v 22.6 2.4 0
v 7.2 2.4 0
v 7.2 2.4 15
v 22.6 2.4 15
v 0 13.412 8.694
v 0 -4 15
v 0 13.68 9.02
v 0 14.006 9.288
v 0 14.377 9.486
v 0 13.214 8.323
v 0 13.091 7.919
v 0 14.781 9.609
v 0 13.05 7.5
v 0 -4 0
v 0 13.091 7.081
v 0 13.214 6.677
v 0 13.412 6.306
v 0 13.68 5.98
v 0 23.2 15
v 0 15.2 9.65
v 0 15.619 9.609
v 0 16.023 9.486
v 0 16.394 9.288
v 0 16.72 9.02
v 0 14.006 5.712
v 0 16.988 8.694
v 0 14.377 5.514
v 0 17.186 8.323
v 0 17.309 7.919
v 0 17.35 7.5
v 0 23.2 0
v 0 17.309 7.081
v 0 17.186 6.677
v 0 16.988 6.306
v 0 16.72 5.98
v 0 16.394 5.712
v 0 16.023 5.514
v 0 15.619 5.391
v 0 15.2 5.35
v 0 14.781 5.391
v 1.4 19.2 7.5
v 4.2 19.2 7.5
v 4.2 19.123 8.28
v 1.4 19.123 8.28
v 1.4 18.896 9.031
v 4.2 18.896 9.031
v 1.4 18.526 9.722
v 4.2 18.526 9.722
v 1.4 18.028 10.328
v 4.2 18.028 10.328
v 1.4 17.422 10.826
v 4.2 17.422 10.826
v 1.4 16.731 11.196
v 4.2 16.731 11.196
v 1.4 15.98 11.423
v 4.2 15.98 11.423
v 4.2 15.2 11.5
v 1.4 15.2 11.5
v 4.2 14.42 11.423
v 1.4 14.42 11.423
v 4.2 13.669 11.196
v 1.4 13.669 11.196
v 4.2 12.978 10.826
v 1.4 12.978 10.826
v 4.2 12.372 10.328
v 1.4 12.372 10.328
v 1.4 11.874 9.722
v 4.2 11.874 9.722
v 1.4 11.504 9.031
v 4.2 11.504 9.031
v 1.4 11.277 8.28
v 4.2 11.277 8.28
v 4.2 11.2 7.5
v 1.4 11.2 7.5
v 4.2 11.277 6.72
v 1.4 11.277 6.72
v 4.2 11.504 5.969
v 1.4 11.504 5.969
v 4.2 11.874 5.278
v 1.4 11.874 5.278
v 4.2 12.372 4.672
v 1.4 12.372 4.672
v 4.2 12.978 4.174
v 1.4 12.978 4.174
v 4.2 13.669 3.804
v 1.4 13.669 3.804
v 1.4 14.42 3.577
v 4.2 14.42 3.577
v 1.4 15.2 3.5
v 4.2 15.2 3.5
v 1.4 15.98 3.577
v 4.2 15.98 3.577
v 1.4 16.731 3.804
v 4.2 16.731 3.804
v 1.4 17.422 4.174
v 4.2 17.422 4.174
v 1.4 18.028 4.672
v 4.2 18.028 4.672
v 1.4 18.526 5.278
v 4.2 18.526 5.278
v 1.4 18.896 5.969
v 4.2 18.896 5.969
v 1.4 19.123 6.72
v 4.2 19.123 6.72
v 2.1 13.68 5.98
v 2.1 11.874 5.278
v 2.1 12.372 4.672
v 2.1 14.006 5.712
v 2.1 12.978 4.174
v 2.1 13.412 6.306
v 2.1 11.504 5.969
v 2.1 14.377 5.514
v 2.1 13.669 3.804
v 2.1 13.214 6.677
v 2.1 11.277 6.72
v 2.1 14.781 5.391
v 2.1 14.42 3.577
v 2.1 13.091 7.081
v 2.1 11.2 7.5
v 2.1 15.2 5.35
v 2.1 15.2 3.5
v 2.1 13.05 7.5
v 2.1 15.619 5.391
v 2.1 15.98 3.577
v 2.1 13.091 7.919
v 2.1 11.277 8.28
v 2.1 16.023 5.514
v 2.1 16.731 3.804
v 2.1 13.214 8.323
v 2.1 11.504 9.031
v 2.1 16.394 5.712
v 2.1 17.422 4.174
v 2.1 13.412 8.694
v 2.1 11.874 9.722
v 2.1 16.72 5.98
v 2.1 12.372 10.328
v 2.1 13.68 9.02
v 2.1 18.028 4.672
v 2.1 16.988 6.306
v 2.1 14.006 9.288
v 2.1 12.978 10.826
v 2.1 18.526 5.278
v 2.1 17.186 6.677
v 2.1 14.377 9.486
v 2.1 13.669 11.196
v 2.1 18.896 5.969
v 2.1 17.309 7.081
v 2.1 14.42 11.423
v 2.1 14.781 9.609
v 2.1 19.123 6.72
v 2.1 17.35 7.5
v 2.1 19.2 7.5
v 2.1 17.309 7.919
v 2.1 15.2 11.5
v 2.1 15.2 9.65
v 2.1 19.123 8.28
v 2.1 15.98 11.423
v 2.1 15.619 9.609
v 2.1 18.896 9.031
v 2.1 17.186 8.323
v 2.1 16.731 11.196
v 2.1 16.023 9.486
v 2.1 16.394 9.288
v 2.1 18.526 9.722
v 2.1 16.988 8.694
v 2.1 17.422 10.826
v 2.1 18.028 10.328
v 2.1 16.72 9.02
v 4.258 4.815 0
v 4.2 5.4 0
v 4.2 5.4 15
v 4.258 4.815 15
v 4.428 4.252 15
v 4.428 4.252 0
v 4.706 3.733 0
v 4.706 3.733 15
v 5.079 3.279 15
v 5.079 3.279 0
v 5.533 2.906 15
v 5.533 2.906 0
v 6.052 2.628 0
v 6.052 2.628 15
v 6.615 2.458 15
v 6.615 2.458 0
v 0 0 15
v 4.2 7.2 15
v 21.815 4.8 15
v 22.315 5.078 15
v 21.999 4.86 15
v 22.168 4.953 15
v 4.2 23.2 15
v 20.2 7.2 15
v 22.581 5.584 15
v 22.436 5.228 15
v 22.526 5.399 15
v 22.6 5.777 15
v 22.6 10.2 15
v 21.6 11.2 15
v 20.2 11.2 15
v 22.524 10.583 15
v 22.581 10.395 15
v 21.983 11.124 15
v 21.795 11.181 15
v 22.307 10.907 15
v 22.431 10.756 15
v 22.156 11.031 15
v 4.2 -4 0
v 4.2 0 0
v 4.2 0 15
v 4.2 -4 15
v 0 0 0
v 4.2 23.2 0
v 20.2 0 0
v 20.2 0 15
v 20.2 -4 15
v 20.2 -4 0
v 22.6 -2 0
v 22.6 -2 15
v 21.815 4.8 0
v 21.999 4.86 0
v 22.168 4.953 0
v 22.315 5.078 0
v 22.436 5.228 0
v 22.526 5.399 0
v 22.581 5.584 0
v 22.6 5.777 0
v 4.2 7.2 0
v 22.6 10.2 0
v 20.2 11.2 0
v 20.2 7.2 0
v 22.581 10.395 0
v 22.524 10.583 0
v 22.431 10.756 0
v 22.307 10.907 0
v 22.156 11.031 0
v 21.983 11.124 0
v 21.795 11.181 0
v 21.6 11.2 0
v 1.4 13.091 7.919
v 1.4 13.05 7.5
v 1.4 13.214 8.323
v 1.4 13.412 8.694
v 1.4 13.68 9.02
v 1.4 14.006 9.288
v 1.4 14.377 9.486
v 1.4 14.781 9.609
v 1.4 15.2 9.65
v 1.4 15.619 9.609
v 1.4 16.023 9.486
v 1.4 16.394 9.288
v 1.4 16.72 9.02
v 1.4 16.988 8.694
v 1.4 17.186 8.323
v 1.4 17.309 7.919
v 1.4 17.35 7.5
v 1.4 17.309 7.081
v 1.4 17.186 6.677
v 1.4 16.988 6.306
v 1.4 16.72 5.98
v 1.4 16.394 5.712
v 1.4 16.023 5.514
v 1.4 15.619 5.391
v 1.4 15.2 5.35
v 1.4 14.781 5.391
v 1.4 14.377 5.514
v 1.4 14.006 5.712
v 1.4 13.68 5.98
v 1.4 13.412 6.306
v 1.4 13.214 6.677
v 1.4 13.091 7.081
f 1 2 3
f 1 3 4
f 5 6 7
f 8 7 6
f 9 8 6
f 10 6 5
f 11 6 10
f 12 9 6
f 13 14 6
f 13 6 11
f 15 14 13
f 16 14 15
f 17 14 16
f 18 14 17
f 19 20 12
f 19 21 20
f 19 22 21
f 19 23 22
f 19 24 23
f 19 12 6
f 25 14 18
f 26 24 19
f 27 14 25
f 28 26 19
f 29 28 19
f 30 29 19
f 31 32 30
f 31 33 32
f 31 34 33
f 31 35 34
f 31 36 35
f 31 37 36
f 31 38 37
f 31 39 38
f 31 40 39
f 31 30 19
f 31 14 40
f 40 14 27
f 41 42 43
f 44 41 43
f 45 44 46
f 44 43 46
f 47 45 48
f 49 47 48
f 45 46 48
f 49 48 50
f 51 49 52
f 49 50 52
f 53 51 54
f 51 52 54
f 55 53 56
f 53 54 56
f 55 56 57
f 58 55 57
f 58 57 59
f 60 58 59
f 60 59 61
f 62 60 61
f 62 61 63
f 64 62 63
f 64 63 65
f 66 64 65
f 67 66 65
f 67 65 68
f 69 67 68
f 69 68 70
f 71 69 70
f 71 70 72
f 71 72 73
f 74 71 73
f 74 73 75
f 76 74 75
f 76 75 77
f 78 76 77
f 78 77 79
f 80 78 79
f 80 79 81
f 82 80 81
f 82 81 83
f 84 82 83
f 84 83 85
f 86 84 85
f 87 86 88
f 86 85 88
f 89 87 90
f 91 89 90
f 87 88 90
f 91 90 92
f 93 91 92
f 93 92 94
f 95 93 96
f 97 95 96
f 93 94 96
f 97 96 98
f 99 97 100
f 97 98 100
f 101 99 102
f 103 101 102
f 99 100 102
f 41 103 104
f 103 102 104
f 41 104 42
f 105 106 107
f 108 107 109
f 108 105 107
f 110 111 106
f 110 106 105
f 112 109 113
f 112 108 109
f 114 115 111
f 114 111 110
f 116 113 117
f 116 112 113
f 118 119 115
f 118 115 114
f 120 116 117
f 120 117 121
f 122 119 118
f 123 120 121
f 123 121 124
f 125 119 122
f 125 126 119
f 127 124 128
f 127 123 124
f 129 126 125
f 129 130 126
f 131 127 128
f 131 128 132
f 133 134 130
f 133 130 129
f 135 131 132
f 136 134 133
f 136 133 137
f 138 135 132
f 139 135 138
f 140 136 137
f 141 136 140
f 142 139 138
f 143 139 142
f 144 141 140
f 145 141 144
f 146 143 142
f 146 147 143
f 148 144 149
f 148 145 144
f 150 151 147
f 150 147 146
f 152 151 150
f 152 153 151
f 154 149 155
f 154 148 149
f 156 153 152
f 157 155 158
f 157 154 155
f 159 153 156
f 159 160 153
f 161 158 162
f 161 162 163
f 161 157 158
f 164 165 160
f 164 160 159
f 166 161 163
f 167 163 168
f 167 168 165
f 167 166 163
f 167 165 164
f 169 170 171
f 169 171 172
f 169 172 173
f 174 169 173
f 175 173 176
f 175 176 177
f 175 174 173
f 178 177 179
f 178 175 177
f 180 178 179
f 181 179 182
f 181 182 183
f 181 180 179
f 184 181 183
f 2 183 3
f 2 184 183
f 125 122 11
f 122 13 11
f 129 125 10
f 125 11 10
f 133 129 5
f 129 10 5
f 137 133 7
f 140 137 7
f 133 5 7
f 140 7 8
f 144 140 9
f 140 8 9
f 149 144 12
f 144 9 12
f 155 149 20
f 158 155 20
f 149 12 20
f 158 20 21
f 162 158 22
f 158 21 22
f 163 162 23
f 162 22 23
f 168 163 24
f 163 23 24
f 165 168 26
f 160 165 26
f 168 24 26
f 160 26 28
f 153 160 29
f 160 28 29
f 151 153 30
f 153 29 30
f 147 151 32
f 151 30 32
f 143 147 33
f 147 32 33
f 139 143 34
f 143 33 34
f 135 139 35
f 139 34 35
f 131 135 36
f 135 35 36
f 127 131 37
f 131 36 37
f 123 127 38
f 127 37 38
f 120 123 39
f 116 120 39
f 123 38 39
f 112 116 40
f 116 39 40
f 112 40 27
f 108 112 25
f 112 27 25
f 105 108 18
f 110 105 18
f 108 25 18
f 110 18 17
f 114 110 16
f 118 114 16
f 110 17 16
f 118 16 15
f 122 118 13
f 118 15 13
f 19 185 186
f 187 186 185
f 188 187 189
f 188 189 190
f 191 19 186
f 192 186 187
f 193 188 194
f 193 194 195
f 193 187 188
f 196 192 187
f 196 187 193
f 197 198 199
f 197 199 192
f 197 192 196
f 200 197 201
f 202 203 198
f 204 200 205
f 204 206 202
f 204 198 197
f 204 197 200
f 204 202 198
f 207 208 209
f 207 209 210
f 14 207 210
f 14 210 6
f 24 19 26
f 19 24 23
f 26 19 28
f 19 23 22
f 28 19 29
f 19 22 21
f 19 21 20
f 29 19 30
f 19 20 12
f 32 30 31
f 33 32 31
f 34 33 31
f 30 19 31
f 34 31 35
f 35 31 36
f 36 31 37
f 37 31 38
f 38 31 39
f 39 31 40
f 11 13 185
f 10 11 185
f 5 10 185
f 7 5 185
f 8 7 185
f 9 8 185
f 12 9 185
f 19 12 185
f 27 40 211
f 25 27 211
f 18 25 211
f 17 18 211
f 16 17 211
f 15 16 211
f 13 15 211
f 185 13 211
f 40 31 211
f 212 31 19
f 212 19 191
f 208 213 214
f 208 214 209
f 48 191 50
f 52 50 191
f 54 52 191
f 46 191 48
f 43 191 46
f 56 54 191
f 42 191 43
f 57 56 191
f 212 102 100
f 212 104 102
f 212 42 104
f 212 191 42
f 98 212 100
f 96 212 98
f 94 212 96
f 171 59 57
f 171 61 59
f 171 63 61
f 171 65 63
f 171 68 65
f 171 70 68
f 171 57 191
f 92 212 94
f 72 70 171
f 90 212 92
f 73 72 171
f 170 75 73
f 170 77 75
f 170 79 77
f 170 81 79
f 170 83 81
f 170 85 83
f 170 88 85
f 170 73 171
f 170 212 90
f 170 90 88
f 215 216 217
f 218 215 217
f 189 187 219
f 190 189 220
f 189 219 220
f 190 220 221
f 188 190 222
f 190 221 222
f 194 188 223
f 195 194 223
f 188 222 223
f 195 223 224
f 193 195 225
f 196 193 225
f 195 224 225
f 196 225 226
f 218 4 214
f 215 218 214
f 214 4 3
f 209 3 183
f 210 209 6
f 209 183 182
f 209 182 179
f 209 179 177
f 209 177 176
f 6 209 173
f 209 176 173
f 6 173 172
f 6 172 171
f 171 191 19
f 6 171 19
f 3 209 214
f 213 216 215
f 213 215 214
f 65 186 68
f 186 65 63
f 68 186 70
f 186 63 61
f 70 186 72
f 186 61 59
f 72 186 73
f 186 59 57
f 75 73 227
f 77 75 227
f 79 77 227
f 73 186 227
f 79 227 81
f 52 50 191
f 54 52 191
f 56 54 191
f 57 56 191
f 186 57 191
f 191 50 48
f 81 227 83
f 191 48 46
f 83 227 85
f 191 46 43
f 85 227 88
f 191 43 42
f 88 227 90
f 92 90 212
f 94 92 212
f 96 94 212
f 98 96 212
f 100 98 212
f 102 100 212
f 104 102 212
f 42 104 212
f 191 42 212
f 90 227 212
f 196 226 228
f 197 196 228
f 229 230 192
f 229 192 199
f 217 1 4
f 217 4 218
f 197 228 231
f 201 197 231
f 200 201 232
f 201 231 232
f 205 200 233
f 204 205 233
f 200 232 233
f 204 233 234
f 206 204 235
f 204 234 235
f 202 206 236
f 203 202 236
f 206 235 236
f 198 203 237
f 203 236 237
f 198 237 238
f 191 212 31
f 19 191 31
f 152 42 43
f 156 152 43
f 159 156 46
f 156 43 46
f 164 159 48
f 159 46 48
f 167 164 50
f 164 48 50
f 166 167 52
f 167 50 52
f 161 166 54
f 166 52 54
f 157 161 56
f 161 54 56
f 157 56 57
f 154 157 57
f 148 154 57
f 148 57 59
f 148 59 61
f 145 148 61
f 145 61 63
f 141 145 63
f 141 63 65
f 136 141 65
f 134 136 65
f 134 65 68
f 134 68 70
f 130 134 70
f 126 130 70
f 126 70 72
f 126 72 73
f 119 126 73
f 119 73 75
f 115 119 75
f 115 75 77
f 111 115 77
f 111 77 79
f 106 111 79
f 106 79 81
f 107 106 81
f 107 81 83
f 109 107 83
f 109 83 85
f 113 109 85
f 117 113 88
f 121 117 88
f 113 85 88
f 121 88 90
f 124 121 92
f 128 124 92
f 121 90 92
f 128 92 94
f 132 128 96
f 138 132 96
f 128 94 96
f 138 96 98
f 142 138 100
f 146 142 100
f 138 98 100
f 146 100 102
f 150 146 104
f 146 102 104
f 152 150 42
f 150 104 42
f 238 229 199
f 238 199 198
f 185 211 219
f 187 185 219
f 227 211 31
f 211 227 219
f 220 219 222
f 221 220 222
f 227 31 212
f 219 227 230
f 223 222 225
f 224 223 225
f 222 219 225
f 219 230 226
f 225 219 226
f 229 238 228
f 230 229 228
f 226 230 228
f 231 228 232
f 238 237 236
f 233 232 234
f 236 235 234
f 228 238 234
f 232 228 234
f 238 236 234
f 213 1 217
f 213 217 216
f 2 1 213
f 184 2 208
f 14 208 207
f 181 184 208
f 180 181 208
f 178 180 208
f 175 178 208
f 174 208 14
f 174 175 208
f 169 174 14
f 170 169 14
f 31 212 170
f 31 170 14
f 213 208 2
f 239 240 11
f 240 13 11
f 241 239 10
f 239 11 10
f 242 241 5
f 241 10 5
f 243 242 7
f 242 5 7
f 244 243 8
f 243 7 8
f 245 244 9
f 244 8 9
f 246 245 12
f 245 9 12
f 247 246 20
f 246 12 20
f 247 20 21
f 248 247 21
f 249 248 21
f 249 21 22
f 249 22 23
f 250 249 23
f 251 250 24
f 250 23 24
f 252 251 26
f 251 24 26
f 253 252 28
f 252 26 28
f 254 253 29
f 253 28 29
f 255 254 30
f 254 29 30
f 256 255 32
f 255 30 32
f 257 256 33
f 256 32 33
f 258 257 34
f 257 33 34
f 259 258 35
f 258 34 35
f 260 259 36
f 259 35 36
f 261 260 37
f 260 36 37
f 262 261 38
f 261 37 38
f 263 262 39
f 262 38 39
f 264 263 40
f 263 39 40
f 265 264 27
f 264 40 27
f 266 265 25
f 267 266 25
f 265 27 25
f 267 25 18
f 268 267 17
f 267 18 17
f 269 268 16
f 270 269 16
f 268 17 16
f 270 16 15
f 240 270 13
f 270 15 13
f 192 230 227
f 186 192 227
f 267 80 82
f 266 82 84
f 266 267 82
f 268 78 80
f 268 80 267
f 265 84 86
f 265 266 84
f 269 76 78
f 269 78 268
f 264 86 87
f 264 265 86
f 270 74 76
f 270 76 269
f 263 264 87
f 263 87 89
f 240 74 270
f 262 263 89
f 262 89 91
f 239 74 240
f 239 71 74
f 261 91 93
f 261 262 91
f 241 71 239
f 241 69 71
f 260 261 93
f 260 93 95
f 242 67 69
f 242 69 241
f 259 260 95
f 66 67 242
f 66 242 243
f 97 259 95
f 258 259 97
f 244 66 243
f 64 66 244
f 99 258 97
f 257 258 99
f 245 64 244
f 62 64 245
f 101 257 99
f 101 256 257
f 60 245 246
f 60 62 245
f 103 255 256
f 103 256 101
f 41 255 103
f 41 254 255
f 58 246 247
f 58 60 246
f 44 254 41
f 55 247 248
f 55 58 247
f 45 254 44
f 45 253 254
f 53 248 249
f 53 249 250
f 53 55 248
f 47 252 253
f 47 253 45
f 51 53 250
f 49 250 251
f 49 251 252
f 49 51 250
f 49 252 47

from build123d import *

# Parameters (mm, degrees)
PAD_DEPTH           = 15
HOLE_D              = 4.3
HOLE_DEPTH          = 25
HOLE_CBORE_D        = 8
HOLE_CBORE_DEPTH    = 2.1
PAD001_DEPTH        = 15
HOLE001_D           = 4.3
HOLE001_DEPTH       = 25
HOLE001_CBORE_D     = 8
HOLE001_CBORE_DEPTH = 2.8


with BuildPart() as bottom:
    # Sketch002 → Pad (new body)
    with BuildSketch(Plane.XY):
        with BuildLine():
            Line((0, 0), (21.814893, 4.8))
            ThreePointArc((21.814893, 4.8), (22.379388, 5.150097), (22.6, 5.776638))
            Line((22.6, 5.776638), (22.6, 10.2))
            ThreePointArc((22.6, 10.2), (22.307107, 10.907107), (21.6, 11.2))
            Line((20.2, 11.2), (21.6, 11.2))
            Line((20.2, 7.2), (20.2, 11.2))
            Line((20.2, 7.2), (4.2, 7.2))
            Line((4.2, 7.2), (4.2, 23.2))
            Line((4.2, 23.2), (0, 23.2))
            Line((0, 23.2), (0, 0))
        make_face()
    extrude(amount=PAD_DEPTH)

    # Hole
    with Locations(Plane.YZ.offset(4.2)):
        with Locations((15.2, 7.5)):
            CounterBoreHole(HOLE_D / 2, HOLE_CBORE_D / 2, HOLE_CBORE_DEPTH, depth=HOLE_DEPTH)


with BuildPart() as top:
    # Sketch → Pad001 (new body)
    with BuildSketch(Plane.XY):
        with BuildLine():
            Line((0, 0), (0, 23.2))
            Line((0, 23.2), (4.2, 23.2))
            Line((4.2, 23.2), (4.2, 5.4))
            ThreePointArc((4.2, 5.4), (5.07868, 3.27868), (7.2, 2.4))
            Line((7.2, 2.4), (22.6, 2.4))
            Line((22.6, 2.4), (22.6, 0))
            Line((22.6, 0), (22.6, -2))
            Line((20.2, -4), (22.6, -2))
            Line((20.2, -4), (20.2, 0))
            Line((20.2, 0), (4.2, 0))
            Line((4.2, 0), (4.2, -4))
            Line((4.2, -4), (0, -4))
            Line((0, -4), (0, 0))
        make_face()
    extrude(amount=PAD001_DEPTH)

    # Hole001
    with Locations(Plane.YZ.offset(4.2)):
        with Locations((15.2, 7.5)):
            CounterBoreHole(HOLE001_D / 2, HOLE001_CBORE_D / 2, HOLE001_CBORE_DEPTH, depth=HOLE001_DEPTH)


solid = Compound([bottom.part, top.part])
